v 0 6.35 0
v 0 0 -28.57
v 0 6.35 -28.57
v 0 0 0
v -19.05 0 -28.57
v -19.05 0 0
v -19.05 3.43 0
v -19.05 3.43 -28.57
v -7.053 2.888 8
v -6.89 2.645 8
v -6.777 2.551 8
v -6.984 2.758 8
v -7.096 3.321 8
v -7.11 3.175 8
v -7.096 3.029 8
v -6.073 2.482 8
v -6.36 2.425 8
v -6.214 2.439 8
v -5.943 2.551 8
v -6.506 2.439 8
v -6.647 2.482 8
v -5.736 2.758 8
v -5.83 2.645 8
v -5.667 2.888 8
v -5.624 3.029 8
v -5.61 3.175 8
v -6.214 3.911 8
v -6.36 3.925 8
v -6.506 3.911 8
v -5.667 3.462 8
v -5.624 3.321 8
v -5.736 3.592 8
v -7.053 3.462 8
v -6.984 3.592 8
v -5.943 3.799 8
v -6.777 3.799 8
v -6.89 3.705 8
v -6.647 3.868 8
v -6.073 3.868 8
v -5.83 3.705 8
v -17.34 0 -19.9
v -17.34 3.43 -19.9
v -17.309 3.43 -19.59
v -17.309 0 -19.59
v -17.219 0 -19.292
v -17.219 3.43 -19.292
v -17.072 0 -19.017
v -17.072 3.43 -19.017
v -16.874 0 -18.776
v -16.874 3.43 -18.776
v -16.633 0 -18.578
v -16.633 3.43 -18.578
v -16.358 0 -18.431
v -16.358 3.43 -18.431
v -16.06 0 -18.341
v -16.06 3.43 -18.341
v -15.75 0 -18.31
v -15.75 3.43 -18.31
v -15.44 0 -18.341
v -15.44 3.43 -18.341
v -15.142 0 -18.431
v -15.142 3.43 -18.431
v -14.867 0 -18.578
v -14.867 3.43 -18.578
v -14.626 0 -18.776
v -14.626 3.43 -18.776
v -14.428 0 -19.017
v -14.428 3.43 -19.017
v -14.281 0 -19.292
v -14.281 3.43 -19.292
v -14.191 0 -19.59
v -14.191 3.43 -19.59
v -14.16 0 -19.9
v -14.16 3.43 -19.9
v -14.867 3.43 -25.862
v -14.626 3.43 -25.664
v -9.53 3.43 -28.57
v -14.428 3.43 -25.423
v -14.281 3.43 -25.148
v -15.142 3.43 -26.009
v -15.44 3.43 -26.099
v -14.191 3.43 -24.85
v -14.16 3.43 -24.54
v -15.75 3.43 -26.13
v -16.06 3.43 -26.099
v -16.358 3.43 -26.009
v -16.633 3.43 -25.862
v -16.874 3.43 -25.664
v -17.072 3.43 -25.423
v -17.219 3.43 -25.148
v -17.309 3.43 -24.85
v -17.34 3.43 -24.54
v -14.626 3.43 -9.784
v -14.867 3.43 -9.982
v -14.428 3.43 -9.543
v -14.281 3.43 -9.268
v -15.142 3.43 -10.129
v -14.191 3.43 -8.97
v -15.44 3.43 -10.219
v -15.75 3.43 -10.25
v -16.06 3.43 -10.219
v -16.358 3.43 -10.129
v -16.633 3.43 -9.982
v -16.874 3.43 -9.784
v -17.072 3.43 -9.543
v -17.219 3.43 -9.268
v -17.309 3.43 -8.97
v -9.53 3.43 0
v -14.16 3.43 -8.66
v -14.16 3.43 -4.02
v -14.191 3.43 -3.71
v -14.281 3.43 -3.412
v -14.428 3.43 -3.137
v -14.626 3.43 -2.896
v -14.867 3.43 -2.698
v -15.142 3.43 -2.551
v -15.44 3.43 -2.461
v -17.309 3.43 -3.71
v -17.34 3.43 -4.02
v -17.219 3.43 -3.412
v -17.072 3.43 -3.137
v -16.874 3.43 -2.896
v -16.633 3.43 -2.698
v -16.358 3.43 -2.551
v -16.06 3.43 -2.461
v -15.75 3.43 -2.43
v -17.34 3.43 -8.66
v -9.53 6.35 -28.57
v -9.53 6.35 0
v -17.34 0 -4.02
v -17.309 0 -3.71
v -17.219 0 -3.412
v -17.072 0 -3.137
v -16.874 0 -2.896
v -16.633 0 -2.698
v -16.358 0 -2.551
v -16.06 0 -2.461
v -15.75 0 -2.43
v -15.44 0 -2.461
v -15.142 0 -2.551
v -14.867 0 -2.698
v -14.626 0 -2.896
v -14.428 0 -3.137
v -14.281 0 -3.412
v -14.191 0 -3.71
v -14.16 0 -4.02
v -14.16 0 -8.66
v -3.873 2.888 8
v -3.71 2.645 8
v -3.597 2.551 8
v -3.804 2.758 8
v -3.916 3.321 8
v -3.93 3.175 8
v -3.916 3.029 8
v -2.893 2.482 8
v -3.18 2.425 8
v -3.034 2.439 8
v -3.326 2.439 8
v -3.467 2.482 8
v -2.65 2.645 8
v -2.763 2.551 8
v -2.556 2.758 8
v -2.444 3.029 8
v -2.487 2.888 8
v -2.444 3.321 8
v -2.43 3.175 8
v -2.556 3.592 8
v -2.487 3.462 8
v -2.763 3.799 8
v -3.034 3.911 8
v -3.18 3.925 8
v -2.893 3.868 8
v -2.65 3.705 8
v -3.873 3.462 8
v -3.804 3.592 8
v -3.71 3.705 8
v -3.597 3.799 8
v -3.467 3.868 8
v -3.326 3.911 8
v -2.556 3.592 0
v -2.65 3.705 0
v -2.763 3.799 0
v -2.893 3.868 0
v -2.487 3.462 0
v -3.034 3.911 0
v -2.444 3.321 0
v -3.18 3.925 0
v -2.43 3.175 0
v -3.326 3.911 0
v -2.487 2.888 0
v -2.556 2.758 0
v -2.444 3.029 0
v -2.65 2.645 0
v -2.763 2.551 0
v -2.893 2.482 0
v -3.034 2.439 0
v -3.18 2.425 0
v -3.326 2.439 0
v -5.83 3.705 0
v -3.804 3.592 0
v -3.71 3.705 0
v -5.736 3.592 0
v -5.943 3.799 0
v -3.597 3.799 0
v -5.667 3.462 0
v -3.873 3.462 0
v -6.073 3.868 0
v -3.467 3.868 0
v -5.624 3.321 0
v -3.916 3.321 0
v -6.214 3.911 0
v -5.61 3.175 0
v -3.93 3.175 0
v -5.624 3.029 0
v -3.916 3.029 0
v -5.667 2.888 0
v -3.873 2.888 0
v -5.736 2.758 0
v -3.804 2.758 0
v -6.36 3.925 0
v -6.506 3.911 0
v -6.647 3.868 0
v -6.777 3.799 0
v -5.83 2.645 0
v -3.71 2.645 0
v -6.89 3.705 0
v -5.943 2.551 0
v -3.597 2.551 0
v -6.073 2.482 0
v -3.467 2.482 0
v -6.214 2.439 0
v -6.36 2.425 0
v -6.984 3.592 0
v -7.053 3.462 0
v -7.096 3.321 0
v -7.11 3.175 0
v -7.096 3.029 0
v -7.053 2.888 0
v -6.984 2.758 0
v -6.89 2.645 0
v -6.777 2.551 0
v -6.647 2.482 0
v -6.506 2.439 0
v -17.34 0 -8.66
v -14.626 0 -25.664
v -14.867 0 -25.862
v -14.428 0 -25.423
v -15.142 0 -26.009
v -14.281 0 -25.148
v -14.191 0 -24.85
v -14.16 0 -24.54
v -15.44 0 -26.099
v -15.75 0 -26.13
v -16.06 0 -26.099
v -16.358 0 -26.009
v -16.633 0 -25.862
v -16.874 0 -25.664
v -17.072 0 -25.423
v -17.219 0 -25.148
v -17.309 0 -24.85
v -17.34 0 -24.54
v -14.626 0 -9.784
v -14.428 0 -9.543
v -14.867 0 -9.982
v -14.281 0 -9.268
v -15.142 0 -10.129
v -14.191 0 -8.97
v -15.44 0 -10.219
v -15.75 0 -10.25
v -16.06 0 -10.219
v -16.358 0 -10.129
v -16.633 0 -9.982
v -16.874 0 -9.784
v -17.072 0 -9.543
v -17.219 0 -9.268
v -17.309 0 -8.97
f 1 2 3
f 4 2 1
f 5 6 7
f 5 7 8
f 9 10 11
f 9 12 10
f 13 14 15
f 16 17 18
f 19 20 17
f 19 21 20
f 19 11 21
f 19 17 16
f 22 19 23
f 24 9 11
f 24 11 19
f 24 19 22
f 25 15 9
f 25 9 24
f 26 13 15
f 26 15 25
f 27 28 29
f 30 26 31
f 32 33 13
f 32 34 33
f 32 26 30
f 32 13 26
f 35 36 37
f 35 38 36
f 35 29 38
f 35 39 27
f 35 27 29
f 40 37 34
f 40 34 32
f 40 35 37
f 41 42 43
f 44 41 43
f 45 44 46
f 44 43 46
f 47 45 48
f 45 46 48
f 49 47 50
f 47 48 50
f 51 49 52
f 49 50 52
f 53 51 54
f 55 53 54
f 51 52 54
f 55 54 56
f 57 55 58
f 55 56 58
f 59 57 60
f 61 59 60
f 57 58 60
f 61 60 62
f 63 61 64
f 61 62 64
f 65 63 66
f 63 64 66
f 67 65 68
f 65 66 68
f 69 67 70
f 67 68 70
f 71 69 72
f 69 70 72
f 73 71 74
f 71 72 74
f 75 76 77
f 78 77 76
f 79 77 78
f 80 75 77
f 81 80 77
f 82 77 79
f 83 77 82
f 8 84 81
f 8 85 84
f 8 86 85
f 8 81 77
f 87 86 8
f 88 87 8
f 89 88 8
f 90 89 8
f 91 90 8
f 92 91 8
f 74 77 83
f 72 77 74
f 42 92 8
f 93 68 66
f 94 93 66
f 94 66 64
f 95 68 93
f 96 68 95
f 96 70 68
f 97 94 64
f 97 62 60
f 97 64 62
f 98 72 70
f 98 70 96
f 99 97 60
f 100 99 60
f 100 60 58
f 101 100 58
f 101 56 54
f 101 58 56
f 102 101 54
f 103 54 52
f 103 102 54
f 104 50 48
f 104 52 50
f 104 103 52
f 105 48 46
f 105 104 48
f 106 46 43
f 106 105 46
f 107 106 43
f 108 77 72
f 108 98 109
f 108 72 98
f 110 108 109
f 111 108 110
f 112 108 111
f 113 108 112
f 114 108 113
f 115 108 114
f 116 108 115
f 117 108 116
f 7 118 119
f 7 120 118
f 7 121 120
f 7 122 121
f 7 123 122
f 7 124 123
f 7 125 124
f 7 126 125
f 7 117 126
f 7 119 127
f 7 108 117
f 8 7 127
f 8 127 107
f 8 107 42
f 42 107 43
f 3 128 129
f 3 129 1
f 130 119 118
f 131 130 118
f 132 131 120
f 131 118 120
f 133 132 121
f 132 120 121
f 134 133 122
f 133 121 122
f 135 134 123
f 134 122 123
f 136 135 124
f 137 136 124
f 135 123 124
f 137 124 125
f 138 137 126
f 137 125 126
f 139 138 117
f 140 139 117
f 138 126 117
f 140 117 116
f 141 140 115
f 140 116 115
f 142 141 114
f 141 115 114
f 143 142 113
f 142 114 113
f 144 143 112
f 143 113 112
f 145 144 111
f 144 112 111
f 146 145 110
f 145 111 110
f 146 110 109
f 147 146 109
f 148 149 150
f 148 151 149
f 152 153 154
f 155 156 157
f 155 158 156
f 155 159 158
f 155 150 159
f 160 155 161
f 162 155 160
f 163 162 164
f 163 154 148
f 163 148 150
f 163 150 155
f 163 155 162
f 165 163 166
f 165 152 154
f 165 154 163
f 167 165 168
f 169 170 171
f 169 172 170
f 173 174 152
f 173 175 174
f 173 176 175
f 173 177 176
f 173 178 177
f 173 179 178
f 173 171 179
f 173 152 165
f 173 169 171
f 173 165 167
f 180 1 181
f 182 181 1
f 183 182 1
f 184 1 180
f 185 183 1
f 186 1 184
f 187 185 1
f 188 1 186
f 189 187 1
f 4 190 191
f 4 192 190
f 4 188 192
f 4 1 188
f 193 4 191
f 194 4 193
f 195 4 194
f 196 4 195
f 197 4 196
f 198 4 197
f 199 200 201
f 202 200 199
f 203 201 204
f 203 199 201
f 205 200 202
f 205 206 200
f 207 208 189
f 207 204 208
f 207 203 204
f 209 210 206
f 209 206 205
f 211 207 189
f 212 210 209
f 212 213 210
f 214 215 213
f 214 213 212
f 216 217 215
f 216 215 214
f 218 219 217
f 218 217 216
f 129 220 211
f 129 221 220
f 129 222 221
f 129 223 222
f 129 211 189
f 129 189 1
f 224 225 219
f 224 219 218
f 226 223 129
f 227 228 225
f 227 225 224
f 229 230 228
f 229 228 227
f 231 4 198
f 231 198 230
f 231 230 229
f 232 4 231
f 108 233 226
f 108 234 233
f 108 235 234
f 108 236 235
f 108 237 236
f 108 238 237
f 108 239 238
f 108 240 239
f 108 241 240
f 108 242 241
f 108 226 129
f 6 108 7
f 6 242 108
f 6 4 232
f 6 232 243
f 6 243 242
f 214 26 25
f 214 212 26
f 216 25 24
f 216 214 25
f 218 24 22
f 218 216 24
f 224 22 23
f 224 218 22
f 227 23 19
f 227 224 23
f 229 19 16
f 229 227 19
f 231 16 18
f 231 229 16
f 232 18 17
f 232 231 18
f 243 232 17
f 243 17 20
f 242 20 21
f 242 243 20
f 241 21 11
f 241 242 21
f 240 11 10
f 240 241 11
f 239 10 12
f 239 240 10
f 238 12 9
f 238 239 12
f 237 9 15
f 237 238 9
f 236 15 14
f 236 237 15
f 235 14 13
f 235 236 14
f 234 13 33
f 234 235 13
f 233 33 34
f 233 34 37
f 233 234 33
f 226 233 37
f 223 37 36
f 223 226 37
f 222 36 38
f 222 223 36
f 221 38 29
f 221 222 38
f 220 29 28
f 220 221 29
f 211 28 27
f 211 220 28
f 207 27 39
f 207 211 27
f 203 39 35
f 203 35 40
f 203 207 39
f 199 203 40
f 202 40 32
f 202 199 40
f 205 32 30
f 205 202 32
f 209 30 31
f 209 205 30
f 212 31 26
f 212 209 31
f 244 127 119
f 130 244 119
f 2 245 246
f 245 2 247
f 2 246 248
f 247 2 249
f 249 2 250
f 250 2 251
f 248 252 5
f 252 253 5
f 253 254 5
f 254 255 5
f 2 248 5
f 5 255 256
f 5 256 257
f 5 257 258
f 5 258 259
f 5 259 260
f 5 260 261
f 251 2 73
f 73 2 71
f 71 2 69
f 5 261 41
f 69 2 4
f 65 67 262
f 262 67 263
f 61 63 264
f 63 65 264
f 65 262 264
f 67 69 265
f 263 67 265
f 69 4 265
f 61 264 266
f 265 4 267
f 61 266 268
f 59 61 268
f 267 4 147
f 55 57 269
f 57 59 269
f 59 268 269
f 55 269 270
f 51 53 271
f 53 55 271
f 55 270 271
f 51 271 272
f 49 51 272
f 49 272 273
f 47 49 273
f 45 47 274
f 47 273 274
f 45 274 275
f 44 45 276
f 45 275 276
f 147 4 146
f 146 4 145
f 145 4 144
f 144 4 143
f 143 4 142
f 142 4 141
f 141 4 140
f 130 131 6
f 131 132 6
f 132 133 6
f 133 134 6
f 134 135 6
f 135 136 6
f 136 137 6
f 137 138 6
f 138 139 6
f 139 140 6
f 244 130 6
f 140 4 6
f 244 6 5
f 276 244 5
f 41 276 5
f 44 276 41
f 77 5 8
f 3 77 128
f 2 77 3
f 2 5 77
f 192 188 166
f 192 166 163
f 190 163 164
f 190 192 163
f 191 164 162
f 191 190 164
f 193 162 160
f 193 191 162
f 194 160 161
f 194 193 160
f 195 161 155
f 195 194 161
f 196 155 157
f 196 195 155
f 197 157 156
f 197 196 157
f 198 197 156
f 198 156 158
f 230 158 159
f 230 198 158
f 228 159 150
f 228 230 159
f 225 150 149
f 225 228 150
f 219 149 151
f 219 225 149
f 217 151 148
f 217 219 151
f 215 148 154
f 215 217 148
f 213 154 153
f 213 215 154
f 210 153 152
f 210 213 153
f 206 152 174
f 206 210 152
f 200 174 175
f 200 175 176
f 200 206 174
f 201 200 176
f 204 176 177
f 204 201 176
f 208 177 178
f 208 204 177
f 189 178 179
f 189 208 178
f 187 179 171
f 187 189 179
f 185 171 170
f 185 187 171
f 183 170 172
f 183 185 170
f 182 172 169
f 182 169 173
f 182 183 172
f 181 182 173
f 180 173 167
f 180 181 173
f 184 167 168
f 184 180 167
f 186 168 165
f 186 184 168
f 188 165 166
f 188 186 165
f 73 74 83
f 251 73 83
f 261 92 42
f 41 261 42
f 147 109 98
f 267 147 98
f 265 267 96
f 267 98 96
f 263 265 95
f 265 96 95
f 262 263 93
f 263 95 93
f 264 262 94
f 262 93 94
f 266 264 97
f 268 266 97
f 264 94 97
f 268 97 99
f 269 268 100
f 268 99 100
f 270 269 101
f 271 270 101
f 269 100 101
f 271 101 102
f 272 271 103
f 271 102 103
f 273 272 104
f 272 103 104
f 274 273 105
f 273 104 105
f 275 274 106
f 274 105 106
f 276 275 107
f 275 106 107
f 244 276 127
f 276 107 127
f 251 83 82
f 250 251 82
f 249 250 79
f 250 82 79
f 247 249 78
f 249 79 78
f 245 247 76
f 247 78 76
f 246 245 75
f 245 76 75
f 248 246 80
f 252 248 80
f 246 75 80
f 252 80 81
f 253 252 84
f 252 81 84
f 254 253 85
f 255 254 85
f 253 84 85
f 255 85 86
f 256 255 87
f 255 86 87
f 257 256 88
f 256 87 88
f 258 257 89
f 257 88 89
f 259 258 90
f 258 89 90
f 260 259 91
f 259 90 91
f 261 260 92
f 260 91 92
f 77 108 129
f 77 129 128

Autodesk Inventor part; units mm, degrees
ref_plane "YZ Plane" through (0, 0, 0) normal (1, 0, 0) x (0, 1, 0)
ref_plane "XZ Plane" through (0, 0, 0) normal (0, 1, 0) x (-1, 0, 0)
ref_plane "XY Plane" through (0, 0, 0) normal (0, 0, 1) x (1, 0, 0)
sketch "Sketch1" plane through (0, 0, 0) normal (0, 1, 0) x (-1, 0, 0)
  line L0 (0, 0) -> (19.05, 0)
  line L1 (19.05, 0) -> (19.05, -28.57)
  line L2 (19.05, -28.57) -> (0, -28.57)
  line L3 (0, -28.57) -> (0, 0)
  dimension "d0" = 19.05
  dimension "d1" = 28.57
extrude "Extrusion1" add sketch "Sketch1" along normal blind 3.43
sketch "Sketch2" plane through (0, 3.43, 0) normal (0, 1, 0) x (1, 0, 0)
  line L0 (0, 28.57) -> (-19.05, 28.57) projected
  line L1 (0, 0) -> (-9.53, 0)
  line L2 (-9.53, 0) -> (-9.53, 28.57)
  line L3 (-9.53, 28.57) -> (0, 28.57)
  line L4 (0, 28.57) -> (0, 0)
  dimension "d4" = 9.53
extrude "Extrusion2" add sketch "Sketch2" along normal blind 2.92
sketch "Sketch3" plane through (0, 6.35, 0) normal (0, 1, 0) x (1, 0, 0)
  line L0 (-15.75, 4.02) -> (-15.75, 8.66) construction
  line L1 (-14.16, 4.02) -> (-14.16, 8.66)
  line L2 (-17.34, 8.66) -> (-17.34, 4.02)
  arc A0 (-17.34, 4.02) -> (-14.16, 4.02) centre (-15.75, 4.02) ccw
  arc A1 (-14.16, 8.66) -> (-17.34, 8.66) centre (-15.75, 8.66) ccw
  line L3 (-19.05, 28.57) -> (-19.05, 0) projected
  line L4 (-15.75, 19.9) -> (-15.75, 24.54) construction
  line L5 (-14.16, 19.9) -> (-14.16, 24.54)
  line L6 (-17.34, 24.54) -> (-17.34, 19.9)
  arc A2 (-17.34, 19.9) -> (-14.16, 19.9) centre (-15.75, 19.9) ccw
  arc A3 (-14.16, 24.54) -> (-17.34, 24.54) centre (-15.75, 24.54) ccw
  line L7 (0, 28.57) -> (-9.53, 28.57) projected
  point P0 (0, 0)
  point P1 (-15.75, 6.34)
  point P2 (-15.75, 22.22)
  dimension "d7" = 4.64
  dimension "d8" = 3.18
  dimension "d9" = 3.3
  dimension "d10" = 4.64
  dimension "d11" = 3.18
  dimension "d12" = 15.88
  dimension "d13" = 6.35
extrude "Extrusion3" cut sketch "Sketch3" against normal through all
sketch "Sketch4" plane through (-19.05, 0, 0) normal (0, 0, 1) x (1, 0, 0)
  line L0 (9.52, 6.35) -> (19.05, 6.35) projected
  line L1 (9.52, 6.35) -> (12.69, 6.35)
  line L2 (12.69, 6.35) -> (12.69, 0)
  line L3 (0, 0) -> (19.05, 0) projected
  line L4 (19.05, 0) -> (19.05, 6.35) projected
  line L5 (19.05, 6.35) -> (15.87, 6.35)
  line L6 (15.87, 6.35) -> (15.87, 0)
  circle A0 centre (12.69, 3.175) radius 0.75
  circle A1 centre (15.87, 3.175) radius 0.75
  dimension "d20" = 3.17
  dimension "d21" = 3.18
  dimension "d24" = 1.5
  dimension "d25" = 1.5
extrude "Extrusion4" add sketch "Sketch4" along normal blind 8 contours A0 L2 | L2 A0 | A1 L6 | L6 A1
properties part number "59145_Sensor"
